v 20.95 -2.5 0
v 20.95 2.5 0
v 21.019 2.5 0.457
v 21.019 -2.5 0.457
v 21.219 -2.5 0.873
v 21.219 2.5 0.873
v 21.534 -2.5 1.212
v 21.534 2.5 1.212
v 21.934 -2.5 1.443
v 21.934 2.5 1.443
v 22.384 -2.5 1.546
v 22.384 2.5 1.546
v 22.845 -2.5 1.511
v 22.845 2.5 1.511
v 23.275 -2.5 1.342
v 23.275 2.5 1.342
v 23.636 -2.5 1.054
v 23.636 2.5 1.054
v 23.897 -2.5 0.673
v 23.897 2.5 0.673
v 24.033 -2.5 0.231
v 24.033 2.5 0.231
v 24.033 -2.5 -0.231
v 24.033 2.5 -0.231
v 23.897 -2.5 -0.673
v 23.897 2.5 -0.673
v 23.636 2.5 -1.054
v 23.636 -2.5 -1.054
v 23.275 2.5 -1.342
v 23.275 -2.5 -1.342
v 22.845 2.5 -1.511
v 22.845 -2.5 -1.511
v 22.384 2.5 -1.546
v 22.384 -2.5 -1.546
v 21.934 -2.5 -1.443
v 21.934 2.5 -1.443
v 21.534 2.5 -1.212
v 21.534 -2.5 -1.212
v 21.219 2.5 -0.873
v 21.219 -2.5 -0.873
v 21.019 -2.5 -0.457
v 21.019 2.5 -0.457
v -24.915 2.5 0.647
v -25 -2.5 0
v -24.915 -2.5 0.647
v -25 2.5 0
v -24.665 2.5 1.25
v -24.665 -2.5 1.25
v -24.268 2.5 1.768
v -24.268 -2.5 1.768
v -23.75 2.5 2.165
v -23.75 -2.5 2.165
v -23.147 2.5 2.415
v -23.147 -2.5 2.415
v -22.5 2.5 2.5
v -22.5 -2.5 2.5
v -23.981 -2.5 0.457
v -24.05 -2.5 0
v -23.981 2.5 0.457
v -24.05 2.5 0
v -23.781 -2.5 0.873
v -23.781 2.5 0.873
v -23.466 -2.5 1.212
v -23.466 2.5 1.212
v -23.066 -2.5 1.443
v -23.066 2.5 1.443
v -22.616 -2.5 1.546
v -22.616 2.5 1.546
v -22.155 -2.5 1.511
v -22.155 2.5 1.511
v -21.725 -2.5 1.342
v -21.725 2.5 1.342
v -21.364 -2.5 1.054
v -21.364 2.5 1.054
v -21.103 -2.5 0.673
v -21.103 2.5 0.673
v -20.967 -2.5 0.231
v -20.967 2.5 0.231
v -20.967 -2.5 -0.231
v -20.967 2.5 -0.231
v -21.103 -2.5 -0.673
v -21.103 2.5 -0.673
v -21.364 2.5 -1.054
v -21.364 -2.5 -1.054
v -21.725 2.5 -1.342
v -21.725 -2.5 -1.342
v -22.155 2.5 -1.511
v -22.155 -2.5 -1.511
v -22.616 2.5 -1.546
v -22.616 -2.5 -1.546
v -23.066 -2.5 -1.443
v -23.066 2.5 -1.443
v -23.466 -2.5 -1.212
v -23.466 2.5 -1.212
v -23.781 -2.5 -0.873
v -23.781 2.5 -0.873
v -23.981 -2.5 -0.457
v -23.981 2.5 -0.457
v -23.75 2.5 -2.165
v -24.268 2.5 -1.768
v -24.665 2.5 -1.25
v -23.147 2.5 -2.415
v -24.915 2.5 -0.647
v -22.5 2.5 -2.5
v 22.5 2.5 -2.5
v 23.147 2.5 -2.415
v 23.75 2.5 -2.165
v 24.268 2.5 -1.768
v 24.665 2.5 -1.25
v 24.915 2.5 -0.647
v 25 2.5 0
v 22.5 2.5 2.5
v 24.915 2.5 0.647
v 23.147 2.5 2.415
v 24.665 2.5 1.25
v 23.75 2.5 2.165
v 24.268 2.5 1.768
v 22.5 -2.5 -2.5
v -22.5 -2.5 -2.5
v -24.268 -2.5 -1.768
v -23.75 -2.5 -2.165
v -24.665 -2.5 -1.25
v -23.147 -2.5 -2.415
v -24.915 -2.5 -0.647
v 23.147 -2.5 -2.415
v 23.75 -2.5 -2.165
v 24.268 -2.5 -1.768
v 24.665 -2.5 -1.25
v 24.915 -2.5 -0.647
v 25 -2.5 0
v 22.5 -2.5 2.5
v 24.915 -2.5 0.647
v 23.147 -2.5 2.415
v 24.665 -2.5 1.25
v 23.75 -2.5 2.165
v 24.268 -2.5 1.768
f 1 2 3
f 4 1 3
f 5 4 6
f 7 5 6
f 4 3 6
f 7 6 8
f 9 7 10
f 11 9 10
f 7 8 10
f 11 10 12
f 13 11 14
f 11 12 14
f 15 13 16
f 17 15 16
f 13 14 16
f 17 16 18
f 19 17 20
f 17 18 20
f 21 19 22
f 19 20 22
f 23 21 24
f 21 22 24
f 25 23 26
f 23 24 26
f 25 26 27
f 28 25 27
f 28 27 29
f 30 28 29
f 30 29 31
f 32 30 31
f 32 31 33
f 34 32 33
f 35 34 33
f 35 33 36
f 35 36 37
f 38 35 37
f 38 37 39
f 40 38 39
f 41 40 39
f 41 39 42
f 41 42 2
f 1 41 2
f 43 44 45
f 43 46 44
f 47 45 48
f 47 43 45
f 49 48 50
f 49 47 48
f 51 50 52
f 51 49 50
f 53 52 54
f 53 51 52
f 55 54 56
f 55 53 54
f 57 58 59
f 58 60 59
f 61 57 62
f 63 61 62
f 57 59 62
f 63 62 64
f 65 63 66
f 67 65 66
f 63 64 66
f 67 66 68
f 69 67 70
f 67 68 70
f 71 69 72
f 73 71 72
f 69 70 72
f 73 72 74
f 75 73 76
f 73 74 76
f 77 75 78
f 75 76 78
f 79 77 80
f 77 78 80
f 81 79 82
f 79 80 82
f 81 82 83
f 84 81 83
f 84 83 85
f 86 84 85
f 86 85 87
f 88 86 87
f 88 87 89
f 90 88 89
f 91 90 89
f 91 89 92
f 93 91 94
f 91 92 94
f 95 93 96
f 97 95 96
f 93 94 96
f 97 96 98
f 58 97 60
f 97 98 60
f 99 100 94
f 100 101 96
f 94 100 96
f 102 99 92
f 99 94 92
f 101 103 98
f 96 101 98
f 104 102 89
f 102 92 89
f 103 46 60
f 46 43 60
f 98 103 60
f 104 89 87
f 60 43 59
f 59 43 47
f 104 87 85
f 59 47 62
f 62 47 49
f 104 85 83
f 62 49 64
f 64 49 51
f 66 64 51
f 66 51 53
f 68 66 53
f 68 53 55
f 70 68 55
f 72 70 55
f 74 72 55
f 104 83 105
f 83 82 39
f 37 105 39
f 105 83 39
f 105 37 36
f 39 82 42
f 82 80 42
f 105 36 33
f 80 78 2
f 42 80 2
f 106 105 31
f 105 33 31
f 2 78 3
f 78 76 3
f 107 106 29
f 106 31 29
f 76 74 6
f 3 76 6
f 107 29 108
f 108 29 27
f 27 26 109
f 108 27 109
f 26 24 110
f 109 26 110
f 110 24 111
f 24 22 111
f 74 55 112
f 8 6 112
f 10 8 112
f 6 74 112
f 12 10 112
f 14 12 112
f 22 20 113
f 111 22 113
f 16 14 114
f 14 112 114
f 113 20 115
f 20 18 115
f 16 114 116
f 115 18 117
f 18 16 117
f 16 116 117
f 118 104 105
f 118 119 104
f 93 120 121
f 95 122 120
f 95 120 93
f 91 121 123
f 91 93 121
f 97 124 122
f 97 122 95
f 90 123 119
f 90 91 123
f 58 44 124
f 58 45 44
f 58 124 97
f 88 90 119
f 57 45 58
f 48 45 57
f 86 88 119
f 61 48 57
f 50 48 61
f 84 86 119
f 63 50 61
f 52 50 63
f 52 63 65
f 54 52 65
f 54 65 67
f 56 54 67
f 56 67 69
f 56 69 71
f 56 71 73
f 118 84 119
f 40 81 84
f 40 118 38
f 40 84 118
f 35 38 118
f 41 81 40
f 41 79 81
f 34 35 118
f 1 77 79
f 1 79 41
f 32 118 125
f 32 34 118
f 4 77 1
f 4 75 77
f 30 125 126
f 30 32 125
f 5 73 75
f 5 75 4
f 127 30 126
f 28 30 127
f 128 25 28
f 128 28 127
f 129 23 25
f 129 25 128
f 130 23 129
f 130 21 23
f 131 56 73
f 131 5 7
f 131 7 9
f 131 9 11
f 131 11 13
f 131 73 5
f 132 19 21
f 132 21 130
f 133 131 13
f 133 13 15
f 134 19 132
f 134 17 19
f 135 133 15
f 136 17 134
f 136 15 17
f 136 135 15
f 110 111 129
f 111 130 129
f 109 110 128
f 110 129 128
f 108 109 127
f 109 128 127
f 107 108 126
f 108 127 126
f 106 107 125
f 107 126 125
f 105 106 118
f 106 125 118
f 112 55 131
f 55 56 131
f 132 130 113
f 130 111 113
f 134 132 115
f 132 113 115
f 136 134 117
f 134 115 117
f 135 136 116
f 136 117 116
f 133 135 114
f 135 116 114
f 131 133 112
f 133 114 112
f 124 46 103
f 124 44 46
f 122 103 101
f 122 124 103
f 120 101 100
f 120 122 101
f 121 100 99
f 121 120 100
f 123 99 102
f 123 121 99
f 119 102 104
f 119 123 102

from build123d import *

# Parameters (mm, degrees)
F0_W     = 50
F0_H     = 5
F1_DEPTH = 2.5
F2_R     = 2.49999
F3_R     = 1.55
F4_DEPTH = 12.5


# Not quite as in the source:
# - a fillet or chamfer is up to 0.001 mm smaller than in the source, because OpenCascade refuses the exact size


with BuildPart() as f1:
    # F0 (on Front) → F1 (new body, symmetric)
    with BuildSketch(Plane.XZ):
        Rectangle(F0_W, F0_H)
    extrude(amount=F1_DEPTH, both=True)

    # F2 (radius 2.5 in the source; OpenCascade refuses exactly that, so slightly less here)
    f2_edges = [f1.edges().sort_by_distance(p)[0] for p in [
        (25, 0, 2.5),
        (25, 0, -2.5),
        (-25, 0, 2.5),
        (-25, 0, -2.5),
    ]]
    fillet(f2_edges, radius=F2_R)

    # F3 (on face) → F4 (cut, symmetric)
    with BuildSketch(Plane(origin=(0, 2.5, 0), x_dir=(-1, 0, 0), z_dir=(0, 1, 0))):
        with Locations((-22.5, 0)):
            Circle(F3_R)
        with Locations((22.5, 0)):
            Circle(F3_R)
    extrude(amount=F4_DEPTH, both=True, mode=Mode.SUBTRACT)


solid = f1.part
